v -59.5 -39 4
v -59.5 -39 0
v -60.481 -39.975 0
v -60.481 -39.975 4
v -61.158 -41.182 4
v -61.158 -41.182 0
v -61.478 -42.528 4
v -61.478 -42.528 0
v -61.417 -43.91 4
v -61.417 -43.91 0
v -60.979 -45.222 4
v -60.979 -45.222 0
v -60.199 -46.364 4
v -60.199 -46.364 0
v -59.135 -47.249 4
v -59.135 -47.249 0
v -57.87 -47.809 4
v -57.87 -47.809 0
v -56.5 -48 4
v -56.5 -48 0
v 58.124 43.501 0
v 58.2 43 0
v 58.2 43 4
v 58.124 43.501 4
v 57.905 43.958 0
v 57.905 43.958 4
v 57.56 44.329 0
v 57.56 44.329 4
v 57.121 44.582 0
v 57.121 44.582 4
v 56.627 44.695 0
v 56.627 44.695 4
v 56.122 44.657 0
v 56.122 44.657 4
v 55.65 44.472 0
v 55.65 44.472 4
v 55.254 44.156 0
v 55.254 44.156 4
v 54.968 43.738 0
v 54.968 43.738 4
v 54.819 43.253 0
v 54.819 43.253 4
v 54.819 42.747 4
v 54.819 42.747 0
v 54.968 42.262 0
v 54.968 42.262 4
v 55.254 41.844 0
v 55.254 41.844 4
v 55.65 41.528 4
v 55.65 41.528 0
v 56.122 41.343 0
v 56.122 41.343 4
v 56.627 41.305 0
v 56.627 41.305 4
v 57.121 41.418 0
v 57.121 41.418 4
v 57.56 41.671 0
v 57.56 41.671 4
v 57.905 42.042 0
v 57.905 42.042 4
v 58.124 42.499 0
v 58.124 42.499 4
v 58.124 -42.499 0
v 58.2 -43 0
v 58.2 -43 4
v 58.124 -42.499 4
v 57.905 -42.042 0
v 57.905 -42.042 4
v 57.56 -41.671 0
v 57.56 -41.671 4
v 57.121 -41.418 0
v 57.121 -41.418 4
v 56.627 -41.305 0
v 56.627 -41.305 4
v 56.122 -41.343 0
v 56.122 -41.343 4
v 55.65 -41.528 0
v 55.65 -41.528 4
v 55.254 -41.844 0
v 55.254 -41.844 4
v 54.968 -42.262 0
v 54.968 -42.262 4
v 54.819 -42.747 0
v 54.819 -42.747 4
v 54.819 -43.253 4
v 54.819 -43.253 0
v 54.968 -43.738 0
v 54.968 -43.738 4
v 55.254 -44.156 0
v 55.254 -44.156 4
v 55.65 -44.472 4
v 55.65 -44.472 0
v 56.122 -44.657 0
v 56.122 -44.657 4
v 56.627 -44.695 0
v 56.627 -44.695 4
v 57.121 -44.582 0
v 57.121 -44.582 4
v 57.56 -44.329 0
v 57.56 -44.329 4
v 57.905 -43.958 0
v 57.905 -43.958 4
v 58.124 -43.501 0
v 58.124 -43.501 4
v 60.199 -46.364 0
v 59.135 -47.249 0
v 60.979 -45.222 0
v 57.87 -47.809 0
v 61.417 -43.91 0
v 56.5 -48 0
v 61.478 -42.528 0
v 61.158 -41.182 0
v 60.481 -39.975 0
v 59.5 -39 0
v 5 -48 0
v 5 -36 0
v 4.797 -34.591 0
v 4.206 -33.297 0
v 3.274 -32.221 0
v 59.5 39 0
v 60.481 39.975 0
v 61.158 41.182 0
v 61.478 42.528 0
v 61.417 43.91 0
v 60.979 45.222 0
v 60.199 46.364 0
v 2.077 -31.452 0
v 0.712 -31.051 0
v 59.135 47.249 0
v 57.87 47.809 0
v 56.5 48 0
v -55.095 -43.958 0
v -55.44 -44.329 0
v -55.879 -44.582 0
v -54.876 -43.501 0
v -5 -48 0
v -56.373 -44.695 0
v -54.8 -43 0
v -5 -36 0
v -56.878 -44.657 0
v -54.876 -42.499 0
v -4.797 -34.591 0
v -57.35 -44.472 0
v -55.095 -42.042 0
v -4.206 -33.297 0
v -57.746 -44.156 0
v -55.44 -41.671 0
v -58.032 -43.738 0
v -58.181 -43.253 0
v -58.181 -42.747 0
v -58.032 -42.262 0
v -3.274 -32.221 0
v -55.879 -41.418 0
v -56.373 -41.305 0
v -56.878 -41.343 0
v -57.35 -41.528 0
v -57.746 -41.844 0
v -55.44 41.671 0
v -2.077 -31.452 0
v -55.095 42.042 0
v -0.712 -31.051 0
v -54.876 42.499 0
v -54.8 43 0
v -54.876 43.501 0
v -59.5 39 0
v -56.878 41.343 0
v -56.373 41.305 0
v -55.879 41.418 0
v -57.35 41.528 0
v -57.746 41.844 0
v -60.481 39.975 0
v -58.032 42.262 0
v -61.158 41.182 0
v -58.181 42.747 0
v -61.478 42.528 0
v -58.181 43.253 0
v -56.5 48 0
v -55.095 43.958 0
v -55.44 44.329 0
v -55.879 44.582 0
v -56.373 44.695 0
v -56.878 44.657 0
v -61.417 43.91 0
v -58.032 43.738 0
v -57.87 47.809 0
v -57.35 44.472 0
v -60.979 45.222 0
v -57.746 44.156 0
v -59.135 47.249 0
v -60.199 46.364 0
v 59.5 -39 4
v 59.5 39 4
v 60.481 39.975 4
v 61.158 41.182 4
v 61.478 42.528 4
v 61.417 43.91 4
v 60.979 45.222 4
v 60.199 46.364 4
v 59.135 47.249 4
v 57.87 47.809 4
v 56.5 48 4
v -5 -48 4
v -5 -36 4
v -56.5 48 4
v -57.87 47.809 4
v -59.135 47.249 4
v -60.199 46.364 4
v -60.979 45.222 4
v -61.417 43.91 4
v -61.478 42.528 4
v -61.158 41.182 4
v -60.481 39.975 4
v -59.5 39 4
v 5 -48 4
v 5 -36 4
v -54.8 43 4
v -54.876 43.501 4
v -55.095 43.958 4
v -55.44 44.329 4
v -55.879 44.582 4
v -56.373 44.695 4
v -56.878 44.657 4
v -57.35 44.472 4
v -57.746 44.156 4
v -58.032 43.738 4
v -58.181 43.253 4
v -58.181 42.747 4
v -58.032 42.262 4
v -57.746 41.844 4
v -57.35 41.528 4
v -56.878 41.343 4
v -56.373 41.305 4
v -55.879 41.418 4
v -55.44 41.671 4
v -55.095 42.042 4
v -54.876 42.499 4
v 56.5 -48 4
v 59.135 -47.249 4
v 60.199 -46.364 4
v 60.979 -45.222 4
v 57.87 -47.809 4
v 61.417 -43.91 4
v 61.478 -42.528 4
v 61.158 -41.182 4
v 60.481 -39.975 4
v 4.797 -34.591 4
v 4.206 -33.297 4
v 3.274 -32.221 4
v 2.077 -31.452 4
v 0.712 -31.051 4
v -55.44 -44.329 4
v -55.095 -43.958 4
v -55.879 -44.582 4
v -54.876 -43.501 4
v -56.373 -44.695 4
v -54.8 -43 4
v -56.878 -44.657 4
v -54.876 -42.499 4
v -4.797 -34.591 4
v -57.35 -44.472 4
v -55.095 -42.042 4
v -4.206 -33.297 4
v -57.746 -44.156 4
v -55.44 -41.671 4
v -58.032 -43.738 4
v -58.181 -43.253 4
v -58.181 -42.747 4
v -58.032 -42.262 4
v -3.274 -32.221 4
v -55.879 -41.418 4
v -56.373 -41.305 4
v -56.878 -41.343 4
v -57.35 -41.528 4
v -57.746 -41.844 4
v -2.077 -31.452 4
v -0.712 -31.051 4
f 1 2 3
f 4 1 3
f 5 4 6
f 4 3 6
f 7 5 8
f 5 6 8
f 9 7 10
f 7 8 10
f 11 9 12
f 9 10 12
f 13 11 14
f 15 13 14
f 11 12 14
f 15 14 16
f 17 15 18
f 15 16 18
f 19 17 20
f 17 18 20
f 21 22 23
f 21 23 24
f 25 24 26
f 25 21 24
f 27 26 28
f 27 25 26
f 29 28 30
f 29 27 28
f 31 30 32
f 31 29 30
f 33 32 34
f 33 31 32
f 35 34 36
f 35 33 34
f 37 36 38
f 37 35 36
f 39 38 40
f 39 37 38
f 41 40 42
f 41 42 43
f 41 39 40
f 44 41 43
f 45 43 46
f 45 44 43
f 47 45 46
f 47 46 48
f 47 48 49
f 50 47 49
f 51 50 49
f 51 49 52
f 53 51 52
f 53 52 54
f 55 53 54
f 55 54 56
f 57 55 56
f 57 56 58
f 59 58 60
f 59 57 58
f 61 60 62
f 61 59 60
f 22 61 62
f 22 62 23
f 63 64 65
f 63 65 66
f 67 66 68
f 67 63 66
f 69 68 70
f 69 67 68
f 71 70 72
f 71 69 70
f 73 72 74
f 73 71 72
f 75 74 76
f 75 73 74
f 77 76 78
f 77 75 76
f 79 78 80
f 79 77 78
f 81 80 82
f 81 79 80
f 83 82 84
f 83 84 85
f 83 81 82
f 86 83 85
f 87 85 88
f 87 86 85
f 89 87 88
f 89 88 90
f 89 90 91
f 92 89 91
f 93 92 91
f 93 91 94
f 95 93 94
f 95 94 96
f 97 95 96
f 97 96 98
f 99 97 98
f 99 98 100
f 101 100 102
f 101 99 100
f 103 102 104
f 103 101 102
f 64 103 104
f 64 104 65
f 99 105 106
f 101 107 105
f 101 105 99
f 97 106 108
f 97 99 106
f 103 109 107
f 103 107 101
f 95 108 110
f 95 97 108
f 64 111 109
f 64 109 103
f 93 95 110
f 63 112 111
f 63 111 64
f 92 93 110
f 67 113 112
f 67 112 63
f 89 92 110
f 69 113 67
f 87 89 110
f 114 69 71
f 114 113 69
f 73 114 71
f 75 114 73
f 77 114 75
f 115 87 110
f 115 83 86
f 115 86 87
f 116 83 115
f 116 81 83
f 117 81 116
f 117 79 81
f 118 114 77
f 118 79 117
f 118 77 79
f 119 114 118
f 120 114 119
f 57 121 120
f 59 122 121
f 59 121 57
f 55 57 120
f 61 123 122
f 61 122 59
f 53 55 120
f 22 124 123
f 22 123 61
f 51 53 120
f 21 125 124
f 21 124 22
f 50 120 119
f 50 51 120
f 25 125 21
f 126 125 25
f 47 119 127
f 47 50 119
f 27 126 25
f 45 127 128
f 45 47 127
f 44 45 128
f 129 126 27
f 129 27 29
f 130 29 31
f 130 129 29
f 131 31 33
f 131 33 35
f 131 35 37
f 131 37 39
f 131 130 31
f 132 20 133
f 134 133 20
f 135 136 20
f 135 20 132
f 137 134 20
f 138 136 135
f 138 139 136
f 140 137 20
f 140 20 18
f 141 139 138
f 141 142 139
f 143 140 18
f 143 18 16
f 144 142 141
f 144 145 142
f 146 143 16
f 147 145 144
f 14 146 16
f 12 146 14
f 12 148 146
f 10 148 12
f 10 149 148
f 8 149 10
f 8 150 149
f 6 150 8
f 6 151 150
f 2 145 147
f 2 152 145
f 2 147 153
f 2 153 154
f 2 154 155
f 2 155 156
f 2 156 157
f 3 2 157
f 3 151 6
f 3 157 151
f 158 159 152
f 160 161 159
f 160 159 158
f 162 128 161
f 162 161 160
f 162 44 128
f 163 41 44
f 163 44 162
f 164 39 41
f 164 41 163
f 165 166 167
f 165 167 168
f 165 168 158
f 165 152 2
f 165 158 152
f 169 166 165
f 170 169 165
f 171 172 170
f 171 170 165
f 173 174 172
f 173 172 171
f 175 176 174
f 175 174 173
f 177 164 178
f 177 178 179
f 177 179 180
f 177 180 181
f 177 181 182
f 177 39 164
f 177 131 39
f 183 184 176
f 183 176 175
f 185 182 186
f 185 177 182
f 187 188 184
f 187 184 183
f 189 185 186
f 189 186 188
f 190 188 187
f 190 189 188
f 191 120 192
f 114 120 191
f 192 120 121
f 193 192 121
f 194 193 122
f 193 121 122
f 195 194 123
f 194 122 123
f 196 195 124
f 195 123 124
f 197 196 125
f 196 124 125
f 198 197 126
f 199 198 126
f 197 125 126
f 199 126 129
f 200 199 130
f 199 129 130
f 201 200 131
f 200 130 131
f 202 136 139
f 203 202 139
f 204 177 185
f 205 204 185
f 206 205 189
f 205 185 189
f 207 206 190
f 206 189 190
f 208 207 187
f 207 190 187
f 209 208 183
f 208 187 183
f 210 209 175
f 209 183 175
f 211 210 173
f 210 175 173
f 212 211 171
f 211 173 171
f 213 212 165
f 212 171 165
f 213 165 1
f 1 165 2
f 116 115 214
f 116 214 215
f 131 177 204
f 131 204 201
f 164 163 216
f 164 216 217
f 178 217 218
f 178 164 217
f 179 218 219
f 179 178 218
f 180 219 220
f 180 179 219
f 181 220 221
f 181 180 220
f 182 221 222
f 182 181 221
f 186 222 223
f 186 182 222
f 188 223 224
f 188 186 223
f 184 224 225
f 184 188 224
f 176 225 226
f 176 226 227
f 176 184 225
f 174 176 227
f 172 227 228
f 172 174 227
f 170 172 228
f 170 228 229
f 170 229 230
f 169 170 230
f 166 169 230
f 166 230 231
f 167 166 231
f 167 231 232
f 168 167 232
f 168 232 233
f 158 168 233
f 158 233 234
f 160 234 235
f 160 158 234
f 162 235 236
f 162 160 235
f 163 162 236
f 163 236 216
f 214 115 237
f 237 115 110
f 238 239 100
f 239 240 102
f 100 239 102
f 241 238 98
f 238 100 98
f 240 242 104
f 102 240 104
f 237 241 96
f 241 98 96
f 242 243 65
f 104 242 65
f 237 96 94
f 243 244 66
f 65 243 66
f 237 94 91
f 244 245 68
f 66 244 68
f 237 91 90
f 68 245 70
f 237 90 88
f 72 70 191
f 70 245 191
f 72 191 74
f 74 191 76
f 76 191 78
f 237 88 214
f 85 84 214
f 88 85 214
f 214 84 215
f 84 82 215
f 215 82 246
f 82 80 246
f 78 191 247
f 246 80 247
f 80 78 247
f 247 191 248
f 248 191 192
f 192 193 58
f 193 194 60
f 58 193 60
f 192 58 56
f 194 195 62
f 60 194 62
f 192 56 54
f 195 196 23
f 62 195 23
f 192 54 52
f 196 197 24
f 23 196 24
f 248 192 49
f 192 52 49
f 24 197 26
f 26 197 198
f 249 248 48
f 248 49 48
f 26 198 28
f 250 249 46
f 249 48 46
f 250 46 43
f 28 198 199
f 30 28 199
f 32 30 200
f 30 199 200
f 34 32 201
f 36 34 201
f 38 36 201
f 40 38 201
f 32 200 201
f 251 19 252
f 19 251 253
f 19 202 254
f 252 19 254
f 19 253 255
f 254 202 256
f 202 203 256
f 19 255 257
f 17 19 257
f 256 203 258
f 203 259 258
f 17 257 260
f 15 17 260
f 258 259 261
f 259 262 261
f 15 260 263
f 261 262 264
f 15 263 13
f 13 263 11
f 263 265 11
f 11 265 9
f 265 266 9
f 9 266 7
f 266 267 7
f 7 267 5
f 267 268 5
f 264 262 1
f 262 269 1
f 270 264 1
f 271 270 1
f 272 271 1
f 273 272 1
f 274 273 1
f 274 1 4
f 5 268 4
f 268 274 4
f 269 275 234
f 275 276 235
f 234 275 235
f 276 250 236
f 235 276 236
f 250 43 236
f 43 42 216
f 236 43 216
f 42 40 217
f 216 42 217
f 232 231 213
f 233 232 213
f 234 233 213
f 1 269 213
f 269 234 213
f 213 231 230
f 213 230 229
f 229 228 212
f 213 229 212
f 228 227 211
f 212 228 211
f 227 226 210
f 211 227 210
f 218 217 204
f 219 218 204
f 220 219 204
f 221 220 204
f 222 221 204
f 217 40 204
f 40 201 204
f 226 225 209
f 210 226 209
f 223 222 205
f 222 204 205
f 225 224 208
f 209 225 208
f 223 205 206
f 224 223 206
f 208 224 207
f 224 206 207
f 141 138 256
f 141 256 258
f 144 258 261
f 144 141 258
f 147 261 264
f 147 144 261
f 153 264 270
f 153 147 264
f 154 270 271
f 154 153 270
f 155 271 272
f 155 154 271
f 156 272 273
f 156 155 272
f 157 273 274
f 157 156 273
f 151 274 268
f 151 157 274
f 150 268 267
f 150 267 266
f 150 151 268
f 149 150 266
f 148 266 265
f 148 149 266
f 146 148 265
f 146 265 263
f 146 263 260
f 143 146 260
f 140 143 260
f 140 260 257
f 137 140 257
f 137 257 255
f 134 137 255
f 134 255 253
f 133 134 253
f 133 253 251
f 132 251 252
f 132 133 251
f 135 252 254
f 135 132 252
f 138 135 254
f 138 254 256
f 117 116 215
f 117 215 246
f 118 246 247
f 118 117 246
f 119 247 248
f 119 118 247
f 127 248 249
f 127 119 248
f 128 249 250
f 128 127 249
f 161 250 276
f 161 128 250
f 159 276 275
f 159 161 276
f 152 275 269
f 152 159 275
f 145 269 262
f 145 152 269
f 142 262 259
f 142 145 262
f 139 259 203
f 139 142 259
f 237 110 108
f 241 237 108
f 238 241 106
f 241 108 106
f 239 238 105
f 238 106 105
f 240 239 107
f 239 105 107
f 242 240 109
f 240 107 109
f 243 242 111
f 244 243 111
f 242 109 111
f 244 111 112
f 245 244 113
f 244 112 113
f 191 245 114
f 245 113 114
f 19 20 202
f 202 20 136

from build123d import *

# Parameters (mm, degrees)
SKETCH_R  = 1.7
PAD_DEPTH = 4


with BuildPart() as part:
    # Sketch → Pad (new body)
    with BuildSketch(Plane.XY):
        with BuildLine():
            Line((-56.499984, 48), (56.5, 48))
            ThreePointArc((59.5, 39), (61.243416, 44.581139), (56.5, 48))
            Line((59.5, 39), (59.5, -39))
            ThreePointArc((56.5, -48), (61.243416, -44.581139), (59.5, -39))
            Line((5, -48), (56.5, -48))
            Line((5, -48), (5, -36))
            ThreePointArc((5, -36), (0, -31), (-5, -36))
            Line((-5, -48), (-5, -36))
            Line((-56.5, -48), (-5, -48))
            ThreePointArc((-59.5, -39), (-61.243416, -44.581139), (-56.5, -48))
            Line((-59.5, 39), (-59.5, -39))
            ThreePointArc((-56.499984, 48), (-61.243414, 44.581147), (-59.5, 39))
        make_face()
        with Locations((-56.5, 43)):
            Circle(SKETCH_R, mode=Mode.SUBTRACT)
        with Locations((56.5, 43)):
            Circle(SKETCH_R, mode=Mode.SUBTRACT)
        with Locations((-56.5, -43)):
            Circle(SKETCH_R, mode=Mode.SUBTRACT)
        with Locations((56.5, -43)):
            Circle(SKETCH_R, mode=Mode.SUBTRACT)
    extrude(amount=PAD_DEPTH)


solid = part.part
